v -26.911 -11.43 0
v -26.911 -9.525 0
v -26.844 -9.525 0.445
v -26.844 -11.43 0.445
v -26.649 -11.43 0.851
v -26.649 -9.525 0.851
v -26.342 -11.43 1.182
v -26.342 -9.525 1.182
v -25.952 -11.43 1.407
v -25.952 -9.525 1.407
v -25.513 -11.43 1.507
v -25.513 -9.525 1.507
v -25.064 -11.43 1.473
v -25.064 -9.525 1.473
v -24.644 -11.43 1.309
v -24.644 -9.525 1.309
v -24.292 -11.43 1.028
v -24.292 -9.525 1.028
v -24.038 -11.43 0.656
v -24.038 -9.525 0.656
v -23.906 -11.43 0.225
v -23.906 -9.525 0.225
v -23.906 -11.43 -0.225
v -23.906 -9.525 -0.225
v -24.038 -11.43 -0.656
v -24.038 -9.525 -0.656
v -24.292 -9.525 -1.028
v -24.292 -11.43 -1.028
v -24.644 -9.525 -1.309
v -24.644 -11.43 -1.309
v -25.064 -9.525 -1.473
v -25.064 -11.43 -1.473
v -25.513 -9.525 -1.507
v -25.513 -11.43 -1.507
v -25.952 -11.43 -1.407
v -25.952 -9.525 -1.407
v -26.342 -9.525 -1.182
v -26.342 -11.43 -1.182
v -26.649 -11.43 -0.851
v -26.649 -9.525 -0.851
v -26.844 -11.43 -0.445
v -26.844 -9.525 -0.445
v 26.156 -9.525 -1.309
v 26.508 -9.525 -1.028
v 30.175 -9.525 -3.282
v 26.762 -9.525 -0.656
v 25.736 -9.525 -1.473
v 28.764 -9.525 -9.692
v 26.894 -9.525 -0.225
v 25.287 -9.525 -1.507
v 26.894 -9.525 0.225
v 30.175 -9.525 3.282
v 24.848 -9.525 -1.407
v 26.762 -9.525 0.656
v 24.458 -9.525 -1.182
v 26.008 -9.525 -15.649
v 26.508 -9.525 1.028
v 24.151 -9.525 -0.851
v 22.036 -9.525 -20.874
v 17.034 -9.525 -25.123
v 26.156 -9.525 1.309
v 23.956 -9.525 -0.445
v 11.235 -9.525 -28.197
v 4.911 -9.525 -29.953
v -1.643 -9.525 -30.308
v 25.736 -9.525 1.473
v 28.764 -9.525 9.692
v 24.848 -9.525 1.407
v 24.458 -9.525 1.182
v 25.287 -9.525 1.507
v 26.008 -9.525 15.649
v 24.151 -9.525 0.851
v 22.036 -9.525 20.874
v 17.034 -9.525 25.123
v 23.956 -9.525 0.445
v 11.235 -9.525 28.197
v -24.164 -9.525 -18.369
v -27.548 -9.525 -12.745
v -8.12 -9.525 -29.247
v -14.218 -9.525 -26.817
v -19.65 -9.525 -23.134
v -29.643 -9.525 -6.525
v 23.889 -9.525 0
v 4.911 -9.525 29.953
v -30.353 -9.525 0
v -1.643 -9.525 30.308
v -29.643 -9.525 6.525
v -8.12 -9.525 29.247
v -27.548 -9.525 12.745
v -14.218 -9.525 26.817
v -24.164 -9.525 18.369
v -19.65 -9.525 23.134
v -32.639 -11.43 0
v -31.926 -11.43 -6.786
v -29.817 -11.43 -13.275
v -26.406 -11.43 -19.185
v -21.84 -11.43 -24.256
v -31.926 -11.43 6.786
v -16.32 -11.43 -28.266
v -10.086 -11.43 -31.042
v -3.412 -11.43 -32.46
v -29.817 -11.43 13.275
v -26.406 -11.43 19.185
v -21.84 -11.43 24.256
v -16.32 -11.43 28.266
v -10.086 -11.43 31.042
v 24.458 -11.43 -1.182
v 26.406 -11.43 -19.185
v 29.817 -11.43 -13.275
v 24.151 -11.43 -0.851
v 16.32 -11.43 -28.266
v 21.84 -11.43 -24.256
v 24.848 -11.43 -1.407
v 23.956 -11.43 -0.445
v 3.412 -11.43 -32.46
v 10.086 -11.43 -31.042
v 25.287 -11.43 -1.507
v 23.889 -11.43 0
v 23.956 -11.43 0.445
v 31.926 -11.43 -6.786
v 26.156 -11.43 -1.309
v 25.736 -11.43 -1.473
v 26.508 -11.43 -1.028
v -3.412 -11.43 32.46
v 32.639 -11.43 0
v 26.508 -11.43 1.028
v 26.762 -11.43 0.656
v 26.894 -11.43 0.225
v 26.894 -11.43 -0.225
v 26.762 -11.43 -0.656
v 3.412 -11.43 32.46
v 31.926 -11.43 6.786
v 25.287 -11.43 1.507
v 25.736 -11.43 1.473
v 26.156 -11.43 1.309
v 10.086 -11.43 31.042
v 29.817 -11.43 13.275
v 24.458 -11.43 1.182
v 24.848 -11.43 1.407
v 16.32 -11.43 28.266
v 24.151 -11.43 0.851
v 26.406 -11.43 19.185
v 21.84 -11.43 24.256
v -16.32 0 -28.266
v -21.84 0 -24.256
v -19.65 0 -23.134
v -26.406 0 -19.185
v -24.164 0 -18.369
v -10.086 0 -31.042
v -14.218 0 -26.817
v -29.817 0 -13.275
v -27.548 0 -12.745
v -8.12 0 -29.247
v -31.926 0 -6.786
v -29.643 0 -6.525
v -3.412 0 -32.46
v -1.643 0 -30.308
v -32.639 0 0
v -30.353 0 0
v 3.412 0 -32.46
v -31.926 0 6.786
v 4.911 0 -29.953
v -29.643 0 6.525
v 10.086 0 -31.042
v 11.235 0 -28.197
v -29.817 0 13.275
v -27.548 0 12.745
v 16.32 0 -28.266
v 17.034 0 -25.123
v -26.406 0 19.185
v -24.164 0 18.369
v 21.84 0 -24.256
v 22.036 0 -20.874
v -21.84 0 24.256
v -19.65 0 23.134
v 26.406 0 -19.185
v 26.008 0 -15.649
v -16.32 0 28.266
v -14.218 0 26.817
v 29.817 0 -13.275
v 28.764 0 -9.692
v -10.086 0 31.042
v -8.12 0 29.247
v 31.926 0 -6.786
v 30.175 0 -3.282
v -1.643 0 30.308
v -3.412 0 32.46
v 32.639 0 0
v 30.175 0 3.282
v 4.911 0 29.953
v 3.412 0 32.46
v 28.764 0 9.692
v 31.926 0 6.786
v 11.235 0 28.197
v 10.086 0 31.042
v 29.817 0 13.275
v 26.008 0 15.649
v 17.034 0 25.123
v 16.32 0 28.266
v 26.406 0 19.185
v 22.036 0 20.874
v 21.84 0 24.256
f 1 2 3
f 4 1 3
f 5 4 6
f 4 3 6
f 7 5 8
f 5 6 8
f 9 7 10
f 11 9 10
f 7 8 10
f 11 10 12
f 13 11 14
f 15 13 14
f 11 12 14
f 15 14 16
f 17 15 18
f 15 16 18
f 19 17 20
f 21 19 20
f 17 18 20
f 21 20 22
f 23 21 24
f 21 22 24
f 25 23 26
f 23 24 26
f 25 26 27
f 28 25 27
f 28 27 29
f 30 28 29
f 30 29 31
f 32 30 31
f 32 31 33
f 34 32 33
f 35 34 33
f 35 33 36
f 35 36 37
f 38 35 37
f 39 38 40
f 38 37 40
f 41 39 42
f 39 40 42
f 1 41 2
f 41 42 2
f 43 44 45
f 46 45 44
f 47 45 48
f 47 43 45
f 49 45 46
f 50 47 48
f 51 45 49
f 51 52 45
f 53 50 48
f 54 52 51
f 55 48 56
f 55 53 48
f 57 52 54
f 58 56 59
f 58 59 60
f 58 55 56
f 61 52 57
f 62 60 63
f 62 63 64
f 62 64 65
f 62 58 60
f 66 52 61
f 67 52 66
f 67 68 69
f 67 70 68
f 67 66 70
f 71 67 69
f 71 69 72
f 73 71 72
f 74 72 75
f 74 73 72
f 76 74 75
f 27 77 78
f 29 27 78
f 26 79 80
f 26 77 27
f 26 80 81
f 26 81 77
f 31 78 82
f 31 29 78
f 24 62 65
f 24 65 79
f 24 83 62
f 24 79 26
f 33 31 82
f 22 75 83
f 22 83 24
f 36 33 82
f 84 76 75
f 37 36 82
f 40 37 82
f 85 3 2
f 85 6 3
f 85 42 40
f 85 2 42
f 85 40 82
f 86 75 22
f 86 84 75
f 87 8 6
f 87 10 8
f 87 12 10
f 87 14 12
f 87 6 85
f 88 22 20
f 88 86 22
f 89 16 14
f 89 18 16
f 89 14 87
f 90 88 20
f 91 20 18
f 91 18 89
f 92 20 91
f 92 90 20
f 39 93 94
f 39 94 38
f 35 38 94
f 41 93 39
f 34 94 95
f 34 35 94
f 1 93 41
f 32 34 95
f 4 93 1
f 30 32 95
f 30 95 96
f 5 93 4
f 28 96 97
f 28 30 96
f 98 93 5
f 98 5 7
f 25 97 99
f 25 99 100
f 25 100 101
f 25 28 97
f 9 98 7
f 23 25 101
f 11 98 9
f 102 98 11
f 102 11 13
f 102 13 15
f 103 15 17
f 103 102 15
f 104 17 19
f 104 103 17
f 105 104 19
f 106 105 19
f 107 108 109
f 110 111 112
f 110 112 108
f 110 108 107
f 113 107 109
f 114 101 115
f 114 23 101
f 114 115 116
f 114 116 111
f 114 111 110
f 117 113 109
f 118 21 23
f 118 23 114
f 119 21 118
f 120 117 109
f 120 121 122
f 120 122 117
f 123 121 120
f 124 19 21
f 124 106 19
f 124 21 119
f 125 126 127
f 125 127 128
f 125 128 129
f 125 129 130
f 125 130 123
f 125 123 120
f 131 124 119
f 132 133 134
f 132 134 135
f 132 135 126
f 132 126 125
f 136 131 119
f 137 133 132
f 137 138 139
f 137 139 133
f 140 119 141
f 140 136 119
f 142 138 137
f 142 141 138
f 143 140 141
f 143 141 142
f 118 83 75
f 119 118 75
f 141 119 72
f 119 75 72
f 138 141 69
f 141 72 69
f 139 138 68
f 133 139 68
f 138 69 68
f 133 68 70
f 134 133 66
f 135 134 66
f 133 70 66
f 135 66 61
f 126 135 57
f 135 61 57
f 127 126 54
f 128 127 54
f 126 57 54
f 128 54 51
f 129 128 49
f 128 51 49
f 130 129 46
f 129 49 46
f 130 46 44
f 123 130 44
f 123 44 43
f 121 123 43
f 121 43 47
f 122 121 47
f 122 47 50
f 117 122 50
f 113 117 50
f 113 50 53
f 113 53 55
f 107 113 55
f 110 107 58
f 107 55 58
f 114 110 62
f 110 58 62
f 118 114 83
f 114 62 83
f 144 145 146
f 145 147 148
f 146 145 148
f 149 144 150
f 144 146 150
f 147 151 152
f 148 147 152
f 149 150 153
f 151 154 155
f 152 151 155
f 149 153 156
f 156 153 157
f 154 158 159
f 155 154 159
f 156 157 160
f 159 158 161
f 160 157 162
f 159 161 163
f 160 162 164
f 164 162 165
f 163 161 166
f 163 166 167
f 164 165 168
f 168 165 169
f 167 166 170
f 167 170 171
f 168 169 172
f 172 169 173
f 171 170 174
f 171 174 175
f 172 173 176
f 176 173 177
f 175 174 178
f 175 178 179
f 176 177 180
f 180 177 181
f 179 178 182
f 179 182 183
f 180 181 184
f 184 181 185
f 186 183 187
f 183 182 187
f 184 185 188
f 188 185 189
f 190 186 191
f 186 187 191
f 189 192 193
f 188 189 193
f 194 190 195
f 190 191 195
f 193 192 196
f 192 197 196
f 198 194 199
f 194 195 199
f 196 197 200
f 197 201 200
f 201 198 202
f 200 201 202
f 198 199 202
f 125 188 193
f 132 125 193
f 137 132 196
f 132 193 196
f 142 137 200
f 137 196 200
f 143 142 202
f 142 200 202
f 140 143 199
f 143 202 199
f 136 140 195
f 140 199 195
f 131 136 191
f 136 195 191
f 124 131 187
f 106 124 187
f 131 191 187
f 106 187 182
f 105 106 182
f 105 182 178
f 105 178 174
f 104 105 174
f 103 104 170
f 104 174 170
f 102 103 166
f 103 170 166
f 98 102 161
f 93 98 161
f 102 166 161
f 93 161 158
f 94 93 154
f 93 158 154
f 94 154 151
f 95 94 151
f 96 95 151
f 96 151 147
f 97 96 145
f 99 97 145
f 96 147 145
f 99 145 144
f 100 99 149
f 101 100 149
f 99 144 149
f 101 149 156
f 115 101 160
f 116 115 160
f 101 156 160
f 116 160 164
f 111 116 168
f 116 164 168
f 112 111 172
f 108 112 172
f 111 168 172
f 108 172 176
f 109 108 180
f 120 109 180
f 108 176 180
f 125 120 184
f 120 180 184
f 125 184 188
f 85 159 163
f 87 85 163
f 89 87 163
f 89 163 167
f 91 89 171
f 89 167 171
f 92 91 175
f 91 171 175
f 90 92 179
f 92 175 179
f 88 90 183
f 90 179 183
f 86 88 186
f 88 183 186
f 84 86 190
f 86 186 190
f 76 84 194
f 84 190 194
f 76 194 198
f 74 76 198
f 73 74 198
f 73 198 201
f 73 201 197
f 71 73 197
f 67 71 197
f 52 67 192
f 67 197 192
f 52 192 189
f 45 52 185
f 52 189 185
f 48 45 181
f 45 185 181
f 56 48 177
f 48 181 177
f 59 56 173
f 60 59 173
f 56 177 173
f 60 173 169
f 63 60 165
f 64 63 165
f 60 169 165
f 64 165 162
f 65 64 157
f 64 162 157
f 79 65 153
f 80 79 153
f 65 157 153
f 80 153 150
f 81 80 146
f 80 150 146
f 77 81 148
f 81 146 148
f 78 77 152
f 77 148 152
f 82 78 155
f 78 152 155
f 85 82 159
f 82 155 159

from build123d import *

# Parameters (mm, degrees)
F0_R     = 32.639
F1_DEPTH = 11.43
F2_R     = 30.353
F3_DEPTH = 9.525
F4_R     = 1.5113
F5_DEPTH = 1.905


with BuildPart() as f1:
    # F0 (on Front) → F1 (new body)
    with BuildSketch(Plane.XZ):
        Circle(F0_R)
    extrude(amount=F1_DEPTH)

    # F2 (on face) → F3 (cut)
    with BuildSketch(Plane(origin=(0, 0, 0), x_dir=(-1, 0, 0), z_dir=(0, 1, 0))):
        Circle(F2_R)
    extrude(amount=-F3_DEPTH, mode=Mode.SUBTRACT)

    # F4 (on face) → F5 (cut)
    with BuildSketch(Plane(origin=(0, -9.525, 0), x_dir=(-1, 0, 0), z_dir=(0, 1, 0))):
        with Locations((-25.4, 0)):
            Circle(F4_R)
        with Locations((25.4, 0)):
            Circle(F4_R)
    extrude(amount=-F5_DEPTH, mode=Mode.SUBTRACT)


solid = f1.part
